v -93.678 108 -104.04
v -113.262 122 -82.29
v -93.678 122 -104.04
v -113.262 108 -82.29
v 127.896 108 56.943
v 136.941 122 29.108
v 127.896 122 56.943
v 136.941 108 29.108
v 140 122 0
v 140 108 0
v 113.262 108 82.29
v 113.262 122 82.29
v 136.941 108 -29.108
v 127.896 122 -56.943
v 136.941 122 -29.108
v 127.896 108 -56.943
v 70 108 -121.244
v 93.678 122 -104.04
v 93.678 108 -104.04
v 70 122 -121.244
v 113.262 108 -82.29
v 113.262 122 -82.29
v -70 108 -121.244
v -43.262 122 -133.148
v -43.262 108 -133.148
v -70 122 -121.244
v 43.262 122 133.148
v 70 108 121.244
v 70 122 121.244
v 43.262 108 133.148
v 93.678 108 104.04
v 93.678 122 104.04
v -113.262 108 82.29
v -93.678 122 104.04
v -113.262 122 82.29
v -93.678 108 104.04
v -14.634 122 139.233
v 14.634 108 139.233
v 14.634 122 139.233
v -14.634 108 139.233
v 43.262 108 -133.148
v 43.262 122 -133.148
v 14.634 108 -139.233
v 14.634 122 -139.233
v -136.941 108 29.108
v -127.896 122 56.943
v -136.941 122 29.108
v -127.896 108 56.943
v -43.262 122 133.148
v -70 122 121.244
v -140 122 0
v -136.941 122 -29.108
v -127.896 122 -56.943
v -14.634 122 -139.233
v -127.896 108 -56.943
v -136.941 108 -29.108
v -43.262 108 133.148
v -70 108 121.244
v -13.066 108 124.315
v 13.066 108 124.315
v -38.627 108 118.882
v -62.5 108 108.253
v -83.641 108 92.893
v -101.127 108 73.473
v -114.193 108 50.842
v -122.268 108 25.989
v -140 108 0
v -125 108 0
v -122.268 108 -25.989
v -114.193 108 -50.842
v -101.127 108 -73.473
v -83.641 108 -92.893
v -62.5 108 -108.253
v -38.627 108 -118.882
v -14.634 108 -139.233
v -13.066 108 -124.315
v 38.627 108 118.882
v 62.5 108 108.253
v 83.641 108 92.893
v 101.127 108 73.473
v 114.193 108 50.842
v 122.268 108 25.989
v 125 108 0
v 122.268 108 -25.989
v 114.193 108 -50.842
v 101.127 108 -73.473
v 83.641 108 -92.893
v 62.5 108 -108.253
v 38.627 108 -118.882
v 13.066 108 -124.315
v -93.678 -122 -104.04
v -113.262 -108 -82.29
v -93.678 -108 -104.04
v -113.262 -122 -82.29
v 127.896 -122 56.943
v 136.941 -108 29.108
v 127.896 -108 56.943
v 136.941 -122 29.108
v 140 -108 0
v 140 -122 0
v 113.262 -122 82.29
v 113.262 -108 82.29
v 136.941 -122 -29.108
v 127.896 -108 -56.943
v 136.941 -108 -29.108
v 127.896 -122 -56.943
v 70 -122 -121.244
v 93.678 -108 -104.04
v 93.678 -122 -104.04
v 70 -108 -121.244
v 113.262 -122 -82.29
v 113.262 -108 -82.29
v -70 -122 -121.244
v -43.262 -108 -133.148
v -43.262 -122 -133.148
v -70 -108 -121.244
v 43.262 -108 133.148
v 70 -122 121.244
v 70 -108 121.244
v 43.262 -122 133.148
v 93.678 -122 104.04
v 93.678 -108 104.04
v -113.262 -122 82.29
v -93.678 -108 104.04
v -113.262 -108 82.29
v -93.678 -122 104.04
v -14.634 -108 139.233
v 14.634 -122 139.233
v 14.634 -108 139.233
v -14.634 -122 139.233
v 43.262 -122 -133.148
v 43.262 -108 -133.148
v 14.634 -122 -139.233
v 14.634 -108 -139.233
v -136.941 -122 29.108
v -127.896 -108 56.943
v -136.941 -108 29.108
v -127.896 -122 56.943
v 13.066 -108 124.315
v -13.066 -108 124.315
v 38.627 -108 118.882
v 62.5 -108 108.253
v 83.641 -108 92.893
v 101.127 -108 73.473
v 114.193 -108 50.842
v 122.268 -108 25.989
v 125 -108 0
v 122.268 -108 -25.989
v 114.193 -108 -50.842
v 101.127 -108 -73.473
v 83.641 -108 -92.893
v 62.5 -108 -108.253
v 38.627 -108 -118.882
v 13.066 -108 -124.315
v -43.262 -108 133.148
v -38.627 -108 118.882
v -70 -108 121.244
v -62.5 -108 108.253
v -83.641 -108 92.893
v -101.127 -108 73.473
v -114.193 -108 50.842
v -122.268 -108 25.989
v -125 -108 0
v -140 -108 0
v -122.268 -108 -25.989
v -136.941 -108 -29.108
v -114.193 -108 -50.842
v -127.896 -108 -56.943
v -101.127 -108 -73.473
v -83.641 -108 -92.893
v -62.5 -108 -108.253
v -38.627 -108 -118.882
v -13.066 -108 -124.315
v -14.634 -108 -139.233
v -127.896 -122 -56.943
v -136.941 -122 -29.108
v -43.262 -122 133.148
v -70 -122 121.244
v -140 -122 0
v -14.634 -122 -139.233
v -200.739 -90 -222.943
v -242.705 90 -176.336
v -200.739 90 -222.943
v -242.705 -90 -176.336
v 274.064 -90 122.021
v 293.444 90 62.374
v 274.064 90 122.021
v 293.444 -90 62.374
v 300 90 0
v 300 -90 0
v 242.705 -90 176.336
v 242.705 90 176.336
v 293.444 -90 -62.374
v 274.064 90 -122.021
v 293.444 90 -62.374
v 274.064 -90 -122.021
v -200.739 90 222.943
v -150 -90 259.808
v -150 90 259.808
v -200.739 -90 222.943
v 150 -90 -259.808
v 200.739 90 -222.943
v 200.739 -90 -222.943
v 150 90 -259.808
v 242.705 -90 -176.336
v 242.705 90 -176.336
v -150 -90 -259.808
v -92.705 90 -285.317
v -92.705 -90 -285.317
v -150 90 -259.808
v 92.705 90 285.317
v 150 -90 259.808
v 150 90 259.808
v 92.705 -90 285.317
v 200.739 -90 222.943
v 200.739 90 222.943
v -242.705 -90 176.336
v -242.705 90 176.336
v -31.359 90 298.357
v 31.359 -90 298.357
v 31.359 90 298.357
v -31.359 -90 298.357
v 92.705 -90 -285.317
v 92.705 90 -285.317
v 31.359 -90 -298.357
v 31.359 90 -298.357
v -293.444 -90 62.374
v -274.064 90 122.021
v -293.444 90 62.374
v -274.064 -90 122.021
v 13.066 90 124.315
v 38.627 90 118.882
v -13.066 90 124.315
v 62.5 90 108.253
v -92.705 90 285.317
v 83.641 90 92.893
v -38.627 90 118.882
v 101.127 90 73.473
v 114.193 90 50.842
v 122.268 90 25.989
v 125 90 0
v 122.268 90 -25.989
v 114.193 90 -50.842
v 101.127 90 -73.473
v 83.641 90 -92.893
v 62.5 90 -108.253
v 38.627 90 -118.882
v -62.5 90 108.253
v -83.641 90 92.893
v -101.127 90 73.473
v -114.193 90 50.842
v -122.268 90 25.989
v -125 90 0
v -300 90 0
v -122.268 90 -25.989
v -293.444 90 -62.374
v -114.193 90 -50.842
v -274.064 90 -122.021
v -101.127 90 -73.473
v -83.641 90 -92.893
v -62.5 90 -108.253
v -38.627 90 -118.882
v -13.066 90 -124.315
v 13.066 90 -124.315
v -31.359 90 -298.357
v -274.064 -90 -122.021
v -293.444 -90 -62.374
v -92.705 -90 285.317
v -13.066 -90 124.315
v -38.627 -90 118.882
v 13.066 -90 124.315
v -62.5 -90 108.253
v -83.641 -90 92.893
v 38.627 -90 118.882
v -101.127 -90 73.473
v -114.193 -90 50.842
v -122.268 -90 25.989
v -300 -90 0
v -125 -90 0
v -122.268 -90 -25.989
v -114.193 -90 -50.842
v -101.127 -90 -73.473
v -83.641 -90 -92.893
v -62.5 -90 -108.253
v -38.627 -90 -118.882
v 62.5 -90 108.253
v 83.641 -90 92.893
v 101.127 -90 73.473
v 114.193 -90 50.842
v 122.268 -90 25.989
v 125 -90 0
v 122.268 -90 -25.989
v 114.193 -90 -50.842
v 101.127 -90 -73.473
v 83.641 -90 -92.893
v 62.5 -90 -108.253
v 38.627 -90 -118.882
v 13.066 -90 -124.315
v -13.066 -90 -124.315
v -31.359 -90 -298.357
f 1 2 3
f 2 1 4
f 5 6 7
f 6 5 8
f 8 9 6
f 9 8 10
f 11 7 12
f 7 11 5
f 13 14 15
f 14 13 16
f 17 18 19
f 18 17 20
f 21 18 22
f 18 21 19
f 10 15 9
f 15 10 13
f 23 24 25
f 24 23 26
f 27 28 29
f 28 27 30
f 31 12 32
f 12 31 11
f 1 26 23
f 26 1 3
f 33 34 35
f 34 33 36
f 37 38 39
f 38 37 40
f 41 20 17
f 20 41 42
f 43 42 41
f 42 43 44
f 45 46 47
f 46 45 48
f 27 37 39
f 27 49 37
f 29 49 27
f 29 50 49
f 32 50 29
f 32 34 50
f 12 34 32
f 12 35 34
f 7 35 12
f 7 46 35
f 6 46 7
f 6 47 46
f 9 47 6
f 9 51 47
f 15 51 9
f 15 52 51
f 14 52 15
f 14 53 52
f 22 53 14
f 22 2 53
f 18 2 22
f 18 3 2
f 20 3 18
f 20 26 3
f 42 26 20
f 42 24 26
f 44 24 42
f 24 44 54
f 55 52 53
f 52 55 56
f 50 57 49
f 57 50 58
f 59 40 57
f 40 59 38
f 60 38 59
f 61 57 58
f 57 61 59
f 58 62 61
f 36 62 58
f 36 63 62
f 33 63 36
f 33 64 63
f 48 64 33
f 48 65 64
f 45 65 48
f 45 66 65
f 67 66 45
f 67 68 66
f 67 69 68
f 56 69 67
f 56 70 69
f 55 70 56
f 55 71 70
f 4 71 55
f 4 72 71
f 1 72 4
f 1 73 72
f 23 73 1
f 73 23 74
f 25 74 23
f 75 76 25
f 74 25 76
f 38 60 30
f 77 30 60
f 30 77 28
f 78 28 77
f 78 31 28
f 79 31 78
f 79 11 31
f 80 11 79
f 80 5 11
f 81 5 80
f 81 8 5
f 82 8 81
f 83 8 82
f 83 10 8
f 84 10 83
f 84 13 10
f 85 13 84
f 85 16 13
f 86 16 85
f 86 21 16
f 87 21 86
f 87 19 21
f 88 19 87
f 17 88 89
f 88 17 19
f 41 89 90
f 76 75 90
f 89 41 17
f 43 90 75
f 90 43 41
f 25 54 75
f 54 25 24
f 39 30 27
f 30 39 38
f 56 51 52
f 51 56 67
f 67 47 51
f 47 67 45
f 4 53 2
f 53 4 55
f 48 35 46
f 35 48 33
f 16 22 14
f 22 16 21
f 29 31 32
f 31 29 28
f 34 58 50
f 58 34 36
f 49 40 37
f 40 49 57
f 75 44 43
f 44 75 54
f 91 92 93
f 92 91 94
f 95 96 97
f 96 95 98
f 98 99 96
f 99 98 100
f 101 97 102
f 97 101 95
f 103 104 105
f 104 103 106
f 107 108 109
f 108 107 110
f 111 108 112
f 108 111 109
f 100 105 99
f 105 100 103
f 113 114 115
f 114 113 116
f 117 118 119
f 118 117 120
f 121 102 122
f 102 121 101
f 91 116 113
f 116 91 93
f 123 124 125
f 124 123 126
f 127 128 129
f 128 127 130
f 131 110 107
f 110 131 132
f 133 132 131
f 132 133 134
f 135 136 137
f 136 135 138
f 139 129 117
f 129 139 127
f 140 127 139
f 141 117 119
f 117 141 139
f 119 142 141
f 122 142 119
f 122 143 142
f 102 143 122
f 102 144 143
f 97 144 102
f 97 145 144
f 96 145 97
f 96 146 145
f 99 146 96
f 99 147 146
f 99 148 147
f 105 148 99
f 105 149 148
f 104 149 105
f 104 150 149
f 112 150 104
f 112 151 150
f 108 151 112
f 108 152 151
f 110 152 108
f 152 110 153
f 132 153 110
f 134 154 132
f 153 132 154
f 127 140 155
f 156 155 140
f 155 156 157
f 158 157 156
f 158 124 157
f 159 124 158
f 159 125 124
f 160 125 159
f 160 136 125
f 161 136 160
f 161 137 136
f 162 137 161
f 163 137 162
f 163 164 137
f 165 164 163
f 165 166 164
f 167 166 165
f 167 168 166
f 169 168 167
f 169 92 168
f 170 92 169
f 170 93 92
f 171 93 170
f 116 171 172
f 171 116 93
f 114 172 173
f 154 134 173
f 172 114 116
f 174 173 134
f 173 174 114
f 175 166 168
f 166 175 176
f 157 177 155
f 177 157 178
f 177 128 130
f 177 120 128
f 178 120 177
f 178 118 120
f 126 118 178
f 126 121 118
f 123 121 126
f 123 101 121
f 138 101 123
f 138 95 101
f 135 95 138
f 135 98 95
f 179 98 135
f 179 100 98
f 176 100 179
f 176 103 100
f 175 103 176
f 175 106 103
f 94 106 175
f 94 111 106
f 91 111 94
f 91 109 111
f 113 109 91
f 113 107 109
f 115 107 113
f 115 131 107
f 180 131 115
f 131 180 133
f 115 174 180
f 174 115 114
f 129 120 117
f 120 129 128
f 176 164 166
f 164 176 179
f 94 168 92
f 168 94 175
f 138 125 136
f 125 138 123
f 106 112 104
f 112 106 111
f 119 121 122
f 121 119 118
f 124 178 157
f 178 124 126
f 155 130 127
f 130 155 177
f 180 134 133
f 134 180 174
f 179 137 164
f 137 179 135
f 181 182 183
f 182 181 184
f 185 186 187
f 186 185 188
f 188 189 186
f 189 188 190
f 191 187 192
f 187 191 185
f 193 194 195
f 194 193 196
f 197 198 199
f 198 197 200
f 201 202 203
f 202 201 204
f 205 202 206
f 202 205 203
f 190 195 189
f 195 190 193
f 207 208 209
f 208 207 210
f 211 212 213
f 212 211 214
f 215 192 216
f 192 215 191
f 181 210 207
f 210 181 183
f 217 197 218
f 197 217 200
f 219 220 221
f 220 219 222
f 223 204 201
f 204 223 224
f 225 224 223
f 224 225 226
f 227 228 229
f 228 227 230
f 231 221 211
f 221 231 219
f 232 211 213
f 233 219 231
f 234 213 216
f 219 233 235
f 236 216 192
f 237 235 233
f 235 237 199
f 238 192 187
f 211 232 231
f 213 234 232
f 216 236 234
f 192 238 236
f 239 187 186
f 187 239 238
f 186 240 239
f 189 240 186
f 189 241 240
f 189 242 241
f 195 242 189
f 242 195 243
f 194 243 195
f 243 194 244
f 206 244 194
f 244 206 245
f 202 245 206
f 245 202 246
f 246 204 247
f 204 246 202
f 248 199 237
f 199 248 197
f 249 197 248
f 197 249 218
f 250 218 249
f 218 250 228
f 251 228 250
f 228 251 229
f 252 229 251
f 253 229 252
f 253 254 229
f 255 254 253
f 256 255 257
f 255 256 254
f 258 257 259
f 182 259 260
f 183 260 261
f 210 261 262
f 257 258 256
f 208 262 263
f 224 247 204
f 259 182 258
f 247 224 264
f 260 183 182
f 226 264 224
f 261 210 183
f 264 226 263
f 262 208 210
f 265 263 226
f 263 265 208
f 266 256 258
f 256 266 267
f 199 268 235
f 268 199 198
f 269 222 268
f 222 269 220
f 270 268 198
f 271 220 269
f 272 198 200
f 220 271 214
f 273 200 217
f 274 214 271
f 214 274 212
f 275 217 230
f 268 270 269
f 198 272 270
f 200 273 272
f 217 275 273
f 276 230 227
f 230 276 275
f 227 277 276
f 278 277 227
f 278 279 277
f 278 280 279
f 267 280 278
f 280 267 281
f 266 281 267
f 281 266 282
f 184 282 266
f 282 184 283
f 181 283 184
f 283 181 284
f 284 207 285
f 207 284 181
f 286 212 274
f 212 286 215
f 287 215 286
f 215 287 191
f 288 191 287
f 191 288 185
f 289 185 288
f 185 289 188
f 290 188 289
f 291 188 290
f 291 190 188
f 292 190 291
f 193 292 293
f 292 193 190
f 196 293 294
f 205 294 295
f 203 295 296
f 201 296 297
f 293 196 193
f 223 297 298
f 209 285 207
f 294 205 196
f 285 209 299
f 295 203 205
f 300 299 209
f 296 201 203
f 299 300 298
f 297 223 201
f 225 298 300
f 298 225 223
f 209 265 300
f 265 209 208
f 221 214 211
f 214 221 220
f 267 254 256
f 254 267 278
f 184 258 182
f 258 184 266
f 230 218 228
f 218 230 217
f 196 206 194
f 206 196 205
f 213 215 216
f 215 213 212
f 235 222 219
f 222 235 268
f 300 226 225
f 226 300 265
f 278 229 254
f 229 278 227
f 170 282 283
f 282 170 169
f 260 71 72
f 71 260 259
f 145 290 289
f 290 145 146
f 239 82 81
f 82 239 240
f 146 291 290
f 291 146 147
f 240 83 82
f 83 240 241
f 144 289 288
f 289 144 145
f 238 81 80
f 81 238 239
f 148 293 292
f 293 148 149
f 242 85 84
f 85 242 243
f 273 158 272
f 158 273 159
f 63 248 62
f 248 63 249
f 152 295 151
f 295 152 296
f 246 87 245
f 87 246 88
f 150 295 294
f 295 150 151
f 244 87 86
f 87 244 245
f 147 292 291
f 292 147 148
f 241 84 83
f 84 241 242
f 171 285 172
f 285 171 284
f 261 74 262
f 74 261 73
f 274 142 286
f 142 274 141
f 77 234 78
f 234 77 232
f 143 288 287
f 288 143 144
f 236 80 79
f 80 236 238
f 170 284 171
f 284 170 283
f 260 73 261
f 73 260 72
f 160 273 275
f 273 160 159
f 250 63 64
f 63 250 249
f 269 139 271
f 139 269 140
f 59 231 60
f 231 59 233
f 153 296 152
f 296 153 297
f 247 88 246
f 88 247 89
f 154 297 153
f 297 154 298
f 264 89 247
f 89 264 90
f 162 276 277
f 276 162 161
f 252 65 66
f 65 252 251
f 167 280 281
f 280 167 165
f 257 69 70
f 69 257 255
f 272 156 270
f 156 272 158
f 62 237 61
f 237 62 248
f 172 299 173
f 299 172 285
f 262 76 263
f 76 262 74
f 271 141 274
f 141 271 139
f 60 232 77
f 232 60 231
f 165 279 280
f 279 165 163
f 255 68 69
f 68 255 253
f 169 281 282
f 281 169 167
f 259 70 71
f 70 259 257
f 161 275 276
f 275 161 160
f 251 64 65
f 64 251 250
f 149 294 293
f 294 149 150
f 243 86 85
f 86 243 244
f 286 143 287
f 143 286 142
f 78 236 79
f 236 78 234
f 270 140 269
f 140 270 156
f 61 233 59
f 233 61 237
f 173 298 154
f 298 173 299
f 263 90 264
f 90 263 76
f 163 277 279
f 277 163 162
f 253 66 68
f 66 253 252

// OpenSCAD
// wheel.scad — pneumatic wheel with electric hub motor, axle along y
include <../params.scad>

module wheel() {
  rotate([90, 0, 0]) {
    color([0.15, 0.15, 0.15])             // tire
      cylinder(h = wheel_w, d = wheel_dia, center = true);
    color("silver")                       // rim + hub motor cartridge
      cylinder(h = wheel_w + 50, d = hub_dia, center = true);
    color("darkorange")                   // clamshell hub cap (sealed, Solaris)
      for (s = [-1, 1])
        translate([0, 0, s * (wheel_w / 2 + 25)])
          cylinder(h = 14, d = hub_dia + 30, center = true);
  }
}

wheel();   // demo
